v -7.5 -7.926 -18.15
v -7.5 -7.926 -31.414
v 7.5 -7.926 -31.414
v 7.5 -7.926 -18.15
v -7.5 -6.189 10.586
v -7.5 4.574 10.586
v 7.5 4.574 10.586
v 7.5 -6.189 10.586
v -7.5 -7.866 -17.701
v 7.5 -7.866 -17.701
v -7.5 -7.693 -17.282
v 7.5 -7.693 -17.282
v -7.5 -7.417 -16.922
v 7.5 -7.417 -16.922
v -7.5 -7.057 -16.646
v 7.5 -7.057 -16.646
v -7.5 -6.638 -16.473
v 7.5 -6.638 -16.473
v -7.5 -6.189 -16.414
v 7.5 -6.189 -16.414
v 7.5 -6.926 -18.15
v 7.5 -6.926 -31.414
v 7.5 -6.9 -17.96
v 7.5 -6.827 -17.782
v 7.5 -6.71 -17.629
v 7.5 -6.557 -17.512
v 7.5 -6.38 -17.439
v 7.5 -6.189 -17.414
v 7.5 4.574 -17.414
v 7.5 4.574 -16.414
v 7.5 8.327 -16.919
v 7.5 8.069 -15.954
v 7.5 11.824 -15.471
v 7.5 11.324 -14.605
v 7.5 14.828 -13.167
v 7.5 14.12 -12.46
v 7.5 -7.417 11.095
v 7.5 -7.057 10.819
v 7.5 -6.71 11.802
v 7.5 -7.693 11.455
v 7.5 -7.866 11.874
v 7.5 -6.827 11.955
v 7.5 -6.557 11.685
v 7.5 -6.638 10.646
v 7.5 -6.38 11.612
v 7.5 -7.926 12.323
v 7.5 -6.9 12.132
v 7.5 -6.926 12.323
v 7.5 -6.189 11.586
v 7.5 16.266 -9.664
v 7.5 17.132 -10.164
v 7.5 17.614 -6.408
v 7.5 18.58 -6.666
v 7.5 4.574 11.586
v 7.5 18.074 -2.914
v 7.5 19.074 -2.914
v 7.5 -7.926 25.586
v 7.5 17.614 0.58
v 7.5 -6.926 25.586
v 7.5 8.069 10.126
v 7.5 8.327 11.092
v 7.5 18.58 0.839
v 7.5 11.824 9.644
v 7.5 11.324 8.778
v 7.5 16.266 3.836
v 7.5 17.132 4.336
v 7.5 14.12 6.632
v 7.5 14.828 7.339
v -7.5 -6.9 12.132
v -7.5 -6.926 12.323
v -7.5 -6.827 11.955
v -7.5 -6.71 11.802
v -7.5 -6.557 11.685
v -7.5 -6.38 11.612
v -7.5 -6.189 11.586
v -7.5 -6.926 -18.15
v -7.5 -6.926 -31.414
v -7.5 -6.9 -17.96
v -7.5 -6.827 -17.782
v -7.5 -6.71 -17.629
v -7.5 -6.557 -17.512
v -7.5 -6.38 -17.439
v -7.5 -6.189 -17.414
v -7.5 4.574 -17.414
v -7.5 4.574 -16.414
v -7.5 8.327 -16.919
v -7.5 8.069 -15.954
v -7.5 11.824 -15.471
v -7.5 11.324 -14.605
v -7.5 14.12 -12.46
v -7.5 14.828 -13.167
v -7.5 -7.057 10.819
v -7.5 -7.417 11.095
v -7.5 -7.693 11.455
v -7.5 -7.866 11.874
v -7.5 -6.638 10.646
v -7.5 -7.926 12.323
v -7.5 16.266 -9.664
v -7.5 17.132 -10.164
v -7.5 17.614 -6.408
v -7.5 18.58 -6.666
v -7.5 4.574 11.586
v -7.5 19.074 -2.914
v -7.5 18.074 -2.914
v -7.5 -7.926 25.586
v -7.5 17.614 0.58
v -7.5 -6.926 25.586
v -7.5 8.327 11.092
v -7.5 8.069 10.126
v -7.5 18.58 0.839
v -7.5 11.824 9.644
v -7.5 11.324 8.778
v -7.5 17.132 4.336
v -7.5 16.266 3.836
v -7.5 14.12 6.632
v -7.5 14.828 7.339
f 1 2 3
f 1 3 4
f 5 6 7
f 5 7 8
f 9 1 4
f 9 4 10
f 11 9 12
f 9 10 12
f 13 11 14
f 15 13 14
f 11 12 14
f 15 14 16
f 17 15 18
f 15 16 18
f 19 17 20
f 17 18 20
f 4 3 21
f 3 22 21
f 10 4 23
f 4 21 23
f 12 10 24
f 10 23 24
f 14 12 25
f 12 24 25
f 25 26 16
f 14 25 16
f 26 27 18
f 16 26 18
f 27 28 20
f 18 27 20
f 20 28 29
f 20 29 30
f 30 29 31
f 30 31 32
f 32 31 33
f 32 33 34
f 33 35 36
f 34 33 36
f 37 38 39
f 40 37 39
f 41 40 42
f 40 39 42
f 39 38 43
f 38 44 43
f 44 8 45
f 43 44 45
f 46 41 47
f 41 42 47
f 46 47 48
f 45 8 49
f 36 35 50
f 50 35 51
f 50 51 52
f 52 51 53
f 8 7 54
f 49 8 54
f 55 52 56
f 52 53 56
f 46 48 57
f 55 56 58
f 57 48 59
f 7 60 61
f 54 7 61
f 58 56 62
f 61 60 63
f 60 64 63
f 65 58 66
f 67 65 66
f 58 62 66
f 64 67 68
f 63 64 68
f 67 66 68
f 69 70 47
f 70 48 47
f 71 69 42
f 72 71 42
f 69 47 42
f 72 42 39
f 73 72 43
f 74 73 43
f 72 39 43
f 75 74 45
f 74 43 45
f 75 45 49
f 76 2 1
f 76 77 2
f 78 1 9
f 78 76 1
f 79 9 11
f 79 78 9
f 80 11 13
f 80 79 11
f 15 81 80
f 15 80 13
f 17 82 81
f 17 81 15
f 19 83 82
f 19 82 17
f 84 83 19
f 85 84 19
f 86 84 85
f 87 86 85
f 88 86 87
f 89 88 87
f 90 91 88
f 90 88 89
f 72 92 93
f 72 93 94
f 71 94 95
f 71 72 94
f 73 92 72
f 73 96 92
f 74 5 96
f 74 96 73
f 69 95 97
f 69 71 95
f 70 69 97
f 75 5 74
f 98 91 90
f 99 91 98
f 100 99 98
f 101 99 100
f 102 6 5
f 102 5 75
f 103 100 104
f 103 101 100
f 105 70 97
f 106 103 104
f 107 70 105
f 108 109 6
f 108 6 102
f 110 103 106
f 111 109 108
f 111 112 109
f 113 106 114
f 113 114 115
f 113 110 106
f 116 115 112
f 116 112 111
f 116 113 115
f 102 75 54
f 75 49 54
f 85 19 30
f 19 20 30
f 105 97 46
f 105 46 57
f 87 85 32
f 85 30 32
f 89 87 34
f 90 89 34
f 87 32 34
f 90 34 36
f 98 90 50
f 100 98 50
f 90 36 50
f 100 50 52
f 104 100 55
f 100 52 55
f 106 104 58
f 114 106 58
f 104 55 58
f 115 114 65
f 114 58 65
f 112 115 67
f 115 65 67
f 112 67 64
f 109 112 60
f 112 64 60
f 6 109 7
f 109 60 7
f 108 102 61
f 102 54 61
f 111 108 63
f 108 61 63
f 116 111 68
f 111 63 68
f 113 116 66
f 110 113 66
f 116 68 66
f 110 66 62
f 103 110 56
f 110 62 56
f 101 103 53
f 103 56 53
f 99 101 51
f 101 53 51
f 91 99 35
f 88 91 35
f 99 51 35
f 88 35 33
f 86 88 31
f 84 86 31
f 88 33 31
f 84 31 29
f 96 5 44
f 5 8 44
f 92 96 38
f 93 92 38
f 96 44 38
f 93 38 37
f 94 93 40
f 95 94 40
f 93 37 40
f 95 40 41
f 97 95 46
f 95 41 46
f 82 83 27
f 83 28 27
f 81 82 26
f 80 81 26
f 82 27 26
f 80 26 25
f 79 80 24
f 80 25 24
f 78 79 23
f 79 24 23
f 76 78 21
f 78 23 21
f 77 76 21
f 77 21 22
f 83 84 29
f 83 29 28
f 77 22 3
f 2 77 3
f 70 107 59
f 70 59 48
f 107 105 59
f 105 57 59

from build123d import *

# Parameters (mm, degrees)
BASE_FLANGE1_DEPTH = 7.5


# Sheet-metal steps are written as plain solids
with BuildPart() as part:
    # Sketch1 → Base-Flange1 (new, symmetric)
    with BuildSketch(Plane(origin=(0, 0, 0), x_dir=(0, 0, -1), z_dir=(1, 0, 0))):
        with BuildLine():
            Line((31.413560175, -7.925529264), (18.150160175, -7.925529264))
            ThreePointArc((18.150160175, -7.925529264), (16.922198539, -7.416890901), (16.413560175, -6.188929264))
            Line((16.413560175, -6.188929264), (16.413560175, 4.574470736))
            ThreePointArc((16.413560175, 4.574470736), (2.913560175, 18.074470736), (-10.586439825, 4.574470736))
            Line((-10.586439825, 4.574470736), (-10.586439825, -6.188929264))
            ThreePointArc((-10.586439825, -6.188929264), (-11.095078189, -7.416890901), (-12.323039825, -7.925529264))
            Line((-12.323039825, -7.925529264), (-25.586439825, -7.925529264))
            Line((-25.586439825, -7.925529264), (-25.586439825, -6.925529264))
            Line((-25.586439825, -6.925529264), (-12.323039825, -6.925529264))
            ThreePointArc((-12.323039825, -6.925529264), (-11.80218497, -6.709784119), (-11.586439825, -6.188929264))
            Line((-11.586439825, -6.188929264), (-11.586439825, 4.574470736))
            ThreePointArc((-11.586439825, 4.574470736), (2.913560175, 19.074470736), (17.413560175, 4.574470736))
            Line((17.413560175, 4.574470736), (17.413560175, -6.188929264))
            ThreePointArc((17.413560175, -6.188929264), (17.62930532, -6.709784119), (18.150160175, -6.925529264))
            Line((18.150160175, -6.925529264), (31.413560175, -6.925529264))
            Line((31.413560175, -6.925529264), (31.413560175, -7.925529264))
        make_face()
    extrude(amount=BASE_FLANGE1_DEPTH, both=True)


solid = part.part
